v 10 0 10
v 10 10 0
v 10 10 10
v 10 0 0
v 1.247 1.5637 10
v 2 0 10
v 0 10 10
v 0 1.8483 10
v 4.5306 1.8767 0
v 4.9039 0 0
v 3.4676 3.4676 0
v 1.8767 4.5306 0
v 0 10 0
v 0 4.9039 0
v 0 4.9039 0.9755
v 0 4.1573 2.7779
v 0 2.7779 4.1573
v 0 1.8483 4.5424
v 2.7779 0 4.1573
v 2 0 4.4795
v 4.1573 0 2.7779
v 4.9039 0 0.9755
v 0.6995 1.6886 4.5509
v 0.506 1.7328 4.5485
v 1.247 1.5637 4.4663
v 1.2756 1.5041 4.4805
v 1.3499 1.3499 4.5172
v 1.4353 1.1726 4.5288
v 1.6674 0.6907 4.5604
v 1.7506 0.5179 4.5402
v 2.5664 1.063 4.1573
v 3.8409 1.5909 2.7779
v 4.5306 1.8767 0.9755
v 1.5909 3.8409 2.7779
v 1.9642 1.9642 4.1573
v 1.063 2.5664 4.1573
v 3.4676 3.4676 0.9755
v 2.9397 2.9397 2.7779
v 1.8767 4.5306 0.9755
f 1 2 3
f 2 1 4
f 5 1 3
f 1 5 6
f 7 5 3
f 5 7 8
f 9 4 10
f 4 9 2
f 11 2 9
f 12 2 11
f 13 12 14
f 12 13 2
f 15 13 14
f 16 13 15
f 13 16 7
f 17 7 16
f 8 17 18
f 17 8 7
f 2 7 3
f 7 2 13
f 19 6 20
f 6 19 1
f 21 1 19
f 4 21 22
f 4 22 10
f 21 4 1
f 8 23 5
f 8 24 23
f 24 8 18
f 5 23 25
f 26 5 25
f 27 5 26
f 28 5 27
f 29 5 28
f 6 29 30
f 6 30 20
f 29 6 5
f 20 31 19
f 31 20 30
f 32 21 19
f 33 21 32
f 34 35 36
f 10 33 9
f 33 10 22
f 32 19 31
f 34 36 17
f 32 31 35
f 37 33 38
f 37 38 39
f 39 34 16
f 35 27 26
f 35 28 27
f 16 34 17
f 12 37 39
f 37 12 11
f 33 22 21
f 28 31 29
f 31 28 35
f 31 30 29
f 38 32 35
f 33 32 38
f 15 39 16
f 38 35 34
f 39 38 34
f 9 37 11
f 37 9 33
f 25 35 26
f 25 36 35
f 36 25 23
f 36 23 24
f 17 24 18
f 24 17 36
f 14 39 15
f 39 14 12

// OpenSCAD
difference() {
	cube(10);
	cylinder(h=10, r=2);
	sphere(5);
}
